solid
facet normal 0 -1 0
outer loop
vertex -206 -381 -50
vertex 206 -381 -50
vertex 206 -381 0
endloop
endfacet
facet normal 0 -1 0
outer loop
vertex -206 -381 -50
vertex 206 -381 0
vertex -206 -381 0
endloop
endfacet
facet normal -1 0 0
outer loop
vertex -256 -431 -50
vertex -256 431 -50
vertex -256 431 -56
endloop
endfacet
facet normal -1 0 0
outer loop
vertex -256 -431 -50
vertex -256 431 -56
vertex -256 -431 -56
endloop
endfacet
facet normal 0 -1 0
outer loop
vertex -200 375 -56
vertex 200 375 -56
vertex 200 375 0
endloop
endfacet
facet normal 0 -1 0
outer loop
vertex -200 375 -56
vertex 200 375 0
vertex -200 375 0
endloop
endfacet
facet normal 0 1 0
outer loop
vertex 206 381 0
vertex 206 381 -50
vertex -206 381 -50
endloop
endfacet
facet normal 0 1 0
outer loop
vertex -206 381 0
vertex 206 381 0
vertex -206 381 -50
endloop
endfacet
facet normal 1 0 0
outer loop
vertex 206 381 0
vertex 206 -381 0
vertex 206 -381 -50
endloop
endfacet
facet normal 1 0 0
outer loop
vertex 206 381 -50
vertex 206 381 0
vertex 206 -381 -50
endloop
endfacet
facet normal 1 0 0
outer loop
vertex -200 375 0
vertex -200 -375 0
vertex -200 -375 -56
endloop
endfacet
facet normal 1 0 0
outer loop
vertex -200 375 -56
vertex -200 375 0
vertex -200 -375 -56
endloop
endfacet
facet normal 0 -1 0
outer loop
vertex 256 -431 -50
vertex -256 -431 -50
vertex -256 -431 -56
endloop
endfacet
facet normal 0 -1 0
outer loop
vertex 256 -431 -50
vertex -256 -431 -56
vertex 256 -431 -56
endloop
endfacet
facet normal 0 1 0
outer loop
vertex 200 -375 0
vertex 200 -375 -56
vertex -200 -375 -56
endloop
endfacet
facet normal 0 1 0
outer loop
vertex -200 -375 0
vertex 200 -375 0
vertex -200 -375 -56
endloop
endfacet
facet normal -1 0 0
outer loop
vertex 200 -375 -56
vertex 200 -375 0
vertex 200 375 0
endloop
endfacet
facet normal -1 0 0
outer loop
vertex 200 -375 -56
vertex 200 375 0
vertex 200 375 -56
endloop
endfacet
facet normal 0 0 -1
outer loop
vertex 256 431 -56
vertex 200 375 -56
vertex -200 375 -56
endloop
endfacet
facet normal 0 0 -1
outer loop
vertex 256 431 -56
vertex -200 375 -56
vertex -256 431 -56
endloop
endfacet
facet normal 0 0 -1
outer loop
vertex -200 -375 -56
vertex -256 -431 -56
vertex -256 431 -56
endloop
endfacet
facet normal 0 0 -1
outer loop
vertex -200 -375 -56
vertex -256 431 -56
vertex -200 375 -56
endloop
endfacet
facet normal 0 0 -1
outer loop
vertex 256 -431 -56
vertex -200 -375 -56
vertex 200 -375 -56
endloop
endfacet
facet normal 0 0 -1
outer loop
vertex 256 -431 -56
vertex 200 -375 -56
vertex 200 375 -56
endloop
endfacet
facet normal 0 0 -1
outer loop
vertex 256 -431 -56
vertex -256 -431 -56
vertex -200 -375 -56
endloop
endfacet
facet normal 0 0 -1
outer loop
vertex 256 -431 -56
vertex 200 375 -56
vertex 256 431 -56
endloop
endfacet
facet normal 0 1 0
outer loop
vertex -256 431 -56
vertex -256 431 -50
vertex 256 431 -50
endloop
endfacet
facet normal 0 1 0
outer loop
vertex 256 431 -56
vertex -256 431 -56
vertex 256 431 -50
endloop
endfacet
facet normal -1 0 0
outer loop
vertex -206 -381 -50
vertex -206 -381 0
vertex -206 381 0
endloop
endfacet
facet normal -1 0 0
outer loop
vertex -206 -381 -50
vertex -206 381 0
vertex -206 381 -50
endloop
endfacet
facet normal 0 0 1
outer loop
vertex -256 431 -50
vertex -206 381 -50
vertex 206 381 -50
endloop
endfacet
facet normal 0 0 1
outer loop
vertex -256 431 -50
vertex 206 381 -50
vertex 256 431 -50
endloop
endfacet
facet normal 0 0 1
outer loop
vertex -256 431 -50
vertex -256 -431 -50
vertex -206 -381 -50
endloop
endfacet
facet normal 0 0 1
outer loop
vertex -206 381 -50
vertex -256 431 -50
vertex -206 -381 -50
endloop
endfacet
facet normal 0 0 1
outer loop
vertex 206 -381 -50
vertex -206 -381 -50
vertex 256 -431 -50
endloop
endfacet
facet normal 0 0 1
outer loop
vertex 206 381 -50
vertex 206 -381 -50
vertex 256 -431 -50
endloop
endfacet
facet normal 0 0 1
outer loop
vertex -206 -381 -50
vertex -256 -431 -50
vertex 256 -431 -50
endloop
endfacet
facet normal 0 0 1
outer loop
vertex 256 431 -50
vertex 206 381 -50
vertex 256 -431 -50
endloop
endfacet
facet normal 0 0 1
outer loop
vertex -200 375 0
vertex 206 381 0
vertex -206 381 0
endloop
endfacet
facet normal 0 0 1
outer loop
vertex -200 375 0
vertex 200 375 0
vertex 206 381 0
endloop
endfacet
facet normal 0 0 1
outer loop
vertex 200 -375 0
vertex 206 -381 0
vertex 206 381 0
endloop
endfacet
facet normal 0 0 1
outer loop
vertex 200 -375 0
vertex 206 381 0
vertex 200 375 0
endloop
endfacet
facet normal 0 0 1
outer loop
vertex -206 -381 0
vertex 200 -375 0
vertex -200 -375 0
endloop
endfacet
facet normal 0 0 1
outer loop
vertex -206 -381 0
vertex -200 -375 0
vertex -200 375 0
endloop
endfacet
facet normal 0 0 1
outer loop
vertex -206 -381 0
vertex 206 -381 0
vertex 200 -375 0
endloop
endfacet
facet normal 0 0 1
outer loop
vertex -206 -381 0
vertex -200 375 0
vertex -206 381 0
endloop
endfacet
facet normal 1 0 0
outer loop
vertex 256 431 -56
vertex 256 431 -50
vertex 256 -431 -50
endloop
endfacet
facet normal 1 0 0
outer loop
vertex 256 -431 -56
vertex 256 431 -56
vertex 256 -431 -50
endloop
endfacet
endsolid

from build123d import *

# Parameters (mm, degrees)
SKETCH054_W            = 400
SKETCH054_H            = 60
PAD003_DEPTH           = 375
SKETCH004_W            = 412
SKETCH004_H            = 50
PAD004_DEPTH           = 381
SKETCH055_W            = 512
SKETCH055_H            = 862
PAD005_DEPTH           = 6
CUT001_PLACEMENT_ANGLE = 180


with BuildPart() as body002:
    # Sketch054 → Pad003 (new body, symmetric)
    with BuildSketch(Plane.XZ):
        with Locations((0, 30)):
            Rectangle(SKETCH054_W, SKETCH054_H)
    extrude(amount=PAD003_DEPTH, both=True)


with BuildPart() as cut001:
    # Sketch004 → Pad004 (new body, symmetric)
    with BuildSketch(Plane.XZ):
        with Locations((0, 25)):
            Rectangle(SKETCH004_W, SKETCH004_H)
    extrude(amount=PAD004_DEPTH, both=True)

    # Sketch055 (on Face3 of Pad004) → Pad005 (join)
    with BuildSketch(Plane(origin=(0, 0, 50), x_dir=(-1, 0, 0), z_dir=(0, 0, 1))):
        Rectangle(SKETCH055_W, SKETCH055_H)
    extrude(amount=PAD005_DEPTH)

    # Cut001: cut Body002
    add(body002.part, mode=Mode.SUBTRACT)


with BuildPart() as cut001_1:
    # Cut001 placement: moved
    add(cut001.part.rotate(Axis((0, 0, 0), (0, 1, 0)), CUT001_PLACEMENT_ANGLE))


solid = cut001_1.part
